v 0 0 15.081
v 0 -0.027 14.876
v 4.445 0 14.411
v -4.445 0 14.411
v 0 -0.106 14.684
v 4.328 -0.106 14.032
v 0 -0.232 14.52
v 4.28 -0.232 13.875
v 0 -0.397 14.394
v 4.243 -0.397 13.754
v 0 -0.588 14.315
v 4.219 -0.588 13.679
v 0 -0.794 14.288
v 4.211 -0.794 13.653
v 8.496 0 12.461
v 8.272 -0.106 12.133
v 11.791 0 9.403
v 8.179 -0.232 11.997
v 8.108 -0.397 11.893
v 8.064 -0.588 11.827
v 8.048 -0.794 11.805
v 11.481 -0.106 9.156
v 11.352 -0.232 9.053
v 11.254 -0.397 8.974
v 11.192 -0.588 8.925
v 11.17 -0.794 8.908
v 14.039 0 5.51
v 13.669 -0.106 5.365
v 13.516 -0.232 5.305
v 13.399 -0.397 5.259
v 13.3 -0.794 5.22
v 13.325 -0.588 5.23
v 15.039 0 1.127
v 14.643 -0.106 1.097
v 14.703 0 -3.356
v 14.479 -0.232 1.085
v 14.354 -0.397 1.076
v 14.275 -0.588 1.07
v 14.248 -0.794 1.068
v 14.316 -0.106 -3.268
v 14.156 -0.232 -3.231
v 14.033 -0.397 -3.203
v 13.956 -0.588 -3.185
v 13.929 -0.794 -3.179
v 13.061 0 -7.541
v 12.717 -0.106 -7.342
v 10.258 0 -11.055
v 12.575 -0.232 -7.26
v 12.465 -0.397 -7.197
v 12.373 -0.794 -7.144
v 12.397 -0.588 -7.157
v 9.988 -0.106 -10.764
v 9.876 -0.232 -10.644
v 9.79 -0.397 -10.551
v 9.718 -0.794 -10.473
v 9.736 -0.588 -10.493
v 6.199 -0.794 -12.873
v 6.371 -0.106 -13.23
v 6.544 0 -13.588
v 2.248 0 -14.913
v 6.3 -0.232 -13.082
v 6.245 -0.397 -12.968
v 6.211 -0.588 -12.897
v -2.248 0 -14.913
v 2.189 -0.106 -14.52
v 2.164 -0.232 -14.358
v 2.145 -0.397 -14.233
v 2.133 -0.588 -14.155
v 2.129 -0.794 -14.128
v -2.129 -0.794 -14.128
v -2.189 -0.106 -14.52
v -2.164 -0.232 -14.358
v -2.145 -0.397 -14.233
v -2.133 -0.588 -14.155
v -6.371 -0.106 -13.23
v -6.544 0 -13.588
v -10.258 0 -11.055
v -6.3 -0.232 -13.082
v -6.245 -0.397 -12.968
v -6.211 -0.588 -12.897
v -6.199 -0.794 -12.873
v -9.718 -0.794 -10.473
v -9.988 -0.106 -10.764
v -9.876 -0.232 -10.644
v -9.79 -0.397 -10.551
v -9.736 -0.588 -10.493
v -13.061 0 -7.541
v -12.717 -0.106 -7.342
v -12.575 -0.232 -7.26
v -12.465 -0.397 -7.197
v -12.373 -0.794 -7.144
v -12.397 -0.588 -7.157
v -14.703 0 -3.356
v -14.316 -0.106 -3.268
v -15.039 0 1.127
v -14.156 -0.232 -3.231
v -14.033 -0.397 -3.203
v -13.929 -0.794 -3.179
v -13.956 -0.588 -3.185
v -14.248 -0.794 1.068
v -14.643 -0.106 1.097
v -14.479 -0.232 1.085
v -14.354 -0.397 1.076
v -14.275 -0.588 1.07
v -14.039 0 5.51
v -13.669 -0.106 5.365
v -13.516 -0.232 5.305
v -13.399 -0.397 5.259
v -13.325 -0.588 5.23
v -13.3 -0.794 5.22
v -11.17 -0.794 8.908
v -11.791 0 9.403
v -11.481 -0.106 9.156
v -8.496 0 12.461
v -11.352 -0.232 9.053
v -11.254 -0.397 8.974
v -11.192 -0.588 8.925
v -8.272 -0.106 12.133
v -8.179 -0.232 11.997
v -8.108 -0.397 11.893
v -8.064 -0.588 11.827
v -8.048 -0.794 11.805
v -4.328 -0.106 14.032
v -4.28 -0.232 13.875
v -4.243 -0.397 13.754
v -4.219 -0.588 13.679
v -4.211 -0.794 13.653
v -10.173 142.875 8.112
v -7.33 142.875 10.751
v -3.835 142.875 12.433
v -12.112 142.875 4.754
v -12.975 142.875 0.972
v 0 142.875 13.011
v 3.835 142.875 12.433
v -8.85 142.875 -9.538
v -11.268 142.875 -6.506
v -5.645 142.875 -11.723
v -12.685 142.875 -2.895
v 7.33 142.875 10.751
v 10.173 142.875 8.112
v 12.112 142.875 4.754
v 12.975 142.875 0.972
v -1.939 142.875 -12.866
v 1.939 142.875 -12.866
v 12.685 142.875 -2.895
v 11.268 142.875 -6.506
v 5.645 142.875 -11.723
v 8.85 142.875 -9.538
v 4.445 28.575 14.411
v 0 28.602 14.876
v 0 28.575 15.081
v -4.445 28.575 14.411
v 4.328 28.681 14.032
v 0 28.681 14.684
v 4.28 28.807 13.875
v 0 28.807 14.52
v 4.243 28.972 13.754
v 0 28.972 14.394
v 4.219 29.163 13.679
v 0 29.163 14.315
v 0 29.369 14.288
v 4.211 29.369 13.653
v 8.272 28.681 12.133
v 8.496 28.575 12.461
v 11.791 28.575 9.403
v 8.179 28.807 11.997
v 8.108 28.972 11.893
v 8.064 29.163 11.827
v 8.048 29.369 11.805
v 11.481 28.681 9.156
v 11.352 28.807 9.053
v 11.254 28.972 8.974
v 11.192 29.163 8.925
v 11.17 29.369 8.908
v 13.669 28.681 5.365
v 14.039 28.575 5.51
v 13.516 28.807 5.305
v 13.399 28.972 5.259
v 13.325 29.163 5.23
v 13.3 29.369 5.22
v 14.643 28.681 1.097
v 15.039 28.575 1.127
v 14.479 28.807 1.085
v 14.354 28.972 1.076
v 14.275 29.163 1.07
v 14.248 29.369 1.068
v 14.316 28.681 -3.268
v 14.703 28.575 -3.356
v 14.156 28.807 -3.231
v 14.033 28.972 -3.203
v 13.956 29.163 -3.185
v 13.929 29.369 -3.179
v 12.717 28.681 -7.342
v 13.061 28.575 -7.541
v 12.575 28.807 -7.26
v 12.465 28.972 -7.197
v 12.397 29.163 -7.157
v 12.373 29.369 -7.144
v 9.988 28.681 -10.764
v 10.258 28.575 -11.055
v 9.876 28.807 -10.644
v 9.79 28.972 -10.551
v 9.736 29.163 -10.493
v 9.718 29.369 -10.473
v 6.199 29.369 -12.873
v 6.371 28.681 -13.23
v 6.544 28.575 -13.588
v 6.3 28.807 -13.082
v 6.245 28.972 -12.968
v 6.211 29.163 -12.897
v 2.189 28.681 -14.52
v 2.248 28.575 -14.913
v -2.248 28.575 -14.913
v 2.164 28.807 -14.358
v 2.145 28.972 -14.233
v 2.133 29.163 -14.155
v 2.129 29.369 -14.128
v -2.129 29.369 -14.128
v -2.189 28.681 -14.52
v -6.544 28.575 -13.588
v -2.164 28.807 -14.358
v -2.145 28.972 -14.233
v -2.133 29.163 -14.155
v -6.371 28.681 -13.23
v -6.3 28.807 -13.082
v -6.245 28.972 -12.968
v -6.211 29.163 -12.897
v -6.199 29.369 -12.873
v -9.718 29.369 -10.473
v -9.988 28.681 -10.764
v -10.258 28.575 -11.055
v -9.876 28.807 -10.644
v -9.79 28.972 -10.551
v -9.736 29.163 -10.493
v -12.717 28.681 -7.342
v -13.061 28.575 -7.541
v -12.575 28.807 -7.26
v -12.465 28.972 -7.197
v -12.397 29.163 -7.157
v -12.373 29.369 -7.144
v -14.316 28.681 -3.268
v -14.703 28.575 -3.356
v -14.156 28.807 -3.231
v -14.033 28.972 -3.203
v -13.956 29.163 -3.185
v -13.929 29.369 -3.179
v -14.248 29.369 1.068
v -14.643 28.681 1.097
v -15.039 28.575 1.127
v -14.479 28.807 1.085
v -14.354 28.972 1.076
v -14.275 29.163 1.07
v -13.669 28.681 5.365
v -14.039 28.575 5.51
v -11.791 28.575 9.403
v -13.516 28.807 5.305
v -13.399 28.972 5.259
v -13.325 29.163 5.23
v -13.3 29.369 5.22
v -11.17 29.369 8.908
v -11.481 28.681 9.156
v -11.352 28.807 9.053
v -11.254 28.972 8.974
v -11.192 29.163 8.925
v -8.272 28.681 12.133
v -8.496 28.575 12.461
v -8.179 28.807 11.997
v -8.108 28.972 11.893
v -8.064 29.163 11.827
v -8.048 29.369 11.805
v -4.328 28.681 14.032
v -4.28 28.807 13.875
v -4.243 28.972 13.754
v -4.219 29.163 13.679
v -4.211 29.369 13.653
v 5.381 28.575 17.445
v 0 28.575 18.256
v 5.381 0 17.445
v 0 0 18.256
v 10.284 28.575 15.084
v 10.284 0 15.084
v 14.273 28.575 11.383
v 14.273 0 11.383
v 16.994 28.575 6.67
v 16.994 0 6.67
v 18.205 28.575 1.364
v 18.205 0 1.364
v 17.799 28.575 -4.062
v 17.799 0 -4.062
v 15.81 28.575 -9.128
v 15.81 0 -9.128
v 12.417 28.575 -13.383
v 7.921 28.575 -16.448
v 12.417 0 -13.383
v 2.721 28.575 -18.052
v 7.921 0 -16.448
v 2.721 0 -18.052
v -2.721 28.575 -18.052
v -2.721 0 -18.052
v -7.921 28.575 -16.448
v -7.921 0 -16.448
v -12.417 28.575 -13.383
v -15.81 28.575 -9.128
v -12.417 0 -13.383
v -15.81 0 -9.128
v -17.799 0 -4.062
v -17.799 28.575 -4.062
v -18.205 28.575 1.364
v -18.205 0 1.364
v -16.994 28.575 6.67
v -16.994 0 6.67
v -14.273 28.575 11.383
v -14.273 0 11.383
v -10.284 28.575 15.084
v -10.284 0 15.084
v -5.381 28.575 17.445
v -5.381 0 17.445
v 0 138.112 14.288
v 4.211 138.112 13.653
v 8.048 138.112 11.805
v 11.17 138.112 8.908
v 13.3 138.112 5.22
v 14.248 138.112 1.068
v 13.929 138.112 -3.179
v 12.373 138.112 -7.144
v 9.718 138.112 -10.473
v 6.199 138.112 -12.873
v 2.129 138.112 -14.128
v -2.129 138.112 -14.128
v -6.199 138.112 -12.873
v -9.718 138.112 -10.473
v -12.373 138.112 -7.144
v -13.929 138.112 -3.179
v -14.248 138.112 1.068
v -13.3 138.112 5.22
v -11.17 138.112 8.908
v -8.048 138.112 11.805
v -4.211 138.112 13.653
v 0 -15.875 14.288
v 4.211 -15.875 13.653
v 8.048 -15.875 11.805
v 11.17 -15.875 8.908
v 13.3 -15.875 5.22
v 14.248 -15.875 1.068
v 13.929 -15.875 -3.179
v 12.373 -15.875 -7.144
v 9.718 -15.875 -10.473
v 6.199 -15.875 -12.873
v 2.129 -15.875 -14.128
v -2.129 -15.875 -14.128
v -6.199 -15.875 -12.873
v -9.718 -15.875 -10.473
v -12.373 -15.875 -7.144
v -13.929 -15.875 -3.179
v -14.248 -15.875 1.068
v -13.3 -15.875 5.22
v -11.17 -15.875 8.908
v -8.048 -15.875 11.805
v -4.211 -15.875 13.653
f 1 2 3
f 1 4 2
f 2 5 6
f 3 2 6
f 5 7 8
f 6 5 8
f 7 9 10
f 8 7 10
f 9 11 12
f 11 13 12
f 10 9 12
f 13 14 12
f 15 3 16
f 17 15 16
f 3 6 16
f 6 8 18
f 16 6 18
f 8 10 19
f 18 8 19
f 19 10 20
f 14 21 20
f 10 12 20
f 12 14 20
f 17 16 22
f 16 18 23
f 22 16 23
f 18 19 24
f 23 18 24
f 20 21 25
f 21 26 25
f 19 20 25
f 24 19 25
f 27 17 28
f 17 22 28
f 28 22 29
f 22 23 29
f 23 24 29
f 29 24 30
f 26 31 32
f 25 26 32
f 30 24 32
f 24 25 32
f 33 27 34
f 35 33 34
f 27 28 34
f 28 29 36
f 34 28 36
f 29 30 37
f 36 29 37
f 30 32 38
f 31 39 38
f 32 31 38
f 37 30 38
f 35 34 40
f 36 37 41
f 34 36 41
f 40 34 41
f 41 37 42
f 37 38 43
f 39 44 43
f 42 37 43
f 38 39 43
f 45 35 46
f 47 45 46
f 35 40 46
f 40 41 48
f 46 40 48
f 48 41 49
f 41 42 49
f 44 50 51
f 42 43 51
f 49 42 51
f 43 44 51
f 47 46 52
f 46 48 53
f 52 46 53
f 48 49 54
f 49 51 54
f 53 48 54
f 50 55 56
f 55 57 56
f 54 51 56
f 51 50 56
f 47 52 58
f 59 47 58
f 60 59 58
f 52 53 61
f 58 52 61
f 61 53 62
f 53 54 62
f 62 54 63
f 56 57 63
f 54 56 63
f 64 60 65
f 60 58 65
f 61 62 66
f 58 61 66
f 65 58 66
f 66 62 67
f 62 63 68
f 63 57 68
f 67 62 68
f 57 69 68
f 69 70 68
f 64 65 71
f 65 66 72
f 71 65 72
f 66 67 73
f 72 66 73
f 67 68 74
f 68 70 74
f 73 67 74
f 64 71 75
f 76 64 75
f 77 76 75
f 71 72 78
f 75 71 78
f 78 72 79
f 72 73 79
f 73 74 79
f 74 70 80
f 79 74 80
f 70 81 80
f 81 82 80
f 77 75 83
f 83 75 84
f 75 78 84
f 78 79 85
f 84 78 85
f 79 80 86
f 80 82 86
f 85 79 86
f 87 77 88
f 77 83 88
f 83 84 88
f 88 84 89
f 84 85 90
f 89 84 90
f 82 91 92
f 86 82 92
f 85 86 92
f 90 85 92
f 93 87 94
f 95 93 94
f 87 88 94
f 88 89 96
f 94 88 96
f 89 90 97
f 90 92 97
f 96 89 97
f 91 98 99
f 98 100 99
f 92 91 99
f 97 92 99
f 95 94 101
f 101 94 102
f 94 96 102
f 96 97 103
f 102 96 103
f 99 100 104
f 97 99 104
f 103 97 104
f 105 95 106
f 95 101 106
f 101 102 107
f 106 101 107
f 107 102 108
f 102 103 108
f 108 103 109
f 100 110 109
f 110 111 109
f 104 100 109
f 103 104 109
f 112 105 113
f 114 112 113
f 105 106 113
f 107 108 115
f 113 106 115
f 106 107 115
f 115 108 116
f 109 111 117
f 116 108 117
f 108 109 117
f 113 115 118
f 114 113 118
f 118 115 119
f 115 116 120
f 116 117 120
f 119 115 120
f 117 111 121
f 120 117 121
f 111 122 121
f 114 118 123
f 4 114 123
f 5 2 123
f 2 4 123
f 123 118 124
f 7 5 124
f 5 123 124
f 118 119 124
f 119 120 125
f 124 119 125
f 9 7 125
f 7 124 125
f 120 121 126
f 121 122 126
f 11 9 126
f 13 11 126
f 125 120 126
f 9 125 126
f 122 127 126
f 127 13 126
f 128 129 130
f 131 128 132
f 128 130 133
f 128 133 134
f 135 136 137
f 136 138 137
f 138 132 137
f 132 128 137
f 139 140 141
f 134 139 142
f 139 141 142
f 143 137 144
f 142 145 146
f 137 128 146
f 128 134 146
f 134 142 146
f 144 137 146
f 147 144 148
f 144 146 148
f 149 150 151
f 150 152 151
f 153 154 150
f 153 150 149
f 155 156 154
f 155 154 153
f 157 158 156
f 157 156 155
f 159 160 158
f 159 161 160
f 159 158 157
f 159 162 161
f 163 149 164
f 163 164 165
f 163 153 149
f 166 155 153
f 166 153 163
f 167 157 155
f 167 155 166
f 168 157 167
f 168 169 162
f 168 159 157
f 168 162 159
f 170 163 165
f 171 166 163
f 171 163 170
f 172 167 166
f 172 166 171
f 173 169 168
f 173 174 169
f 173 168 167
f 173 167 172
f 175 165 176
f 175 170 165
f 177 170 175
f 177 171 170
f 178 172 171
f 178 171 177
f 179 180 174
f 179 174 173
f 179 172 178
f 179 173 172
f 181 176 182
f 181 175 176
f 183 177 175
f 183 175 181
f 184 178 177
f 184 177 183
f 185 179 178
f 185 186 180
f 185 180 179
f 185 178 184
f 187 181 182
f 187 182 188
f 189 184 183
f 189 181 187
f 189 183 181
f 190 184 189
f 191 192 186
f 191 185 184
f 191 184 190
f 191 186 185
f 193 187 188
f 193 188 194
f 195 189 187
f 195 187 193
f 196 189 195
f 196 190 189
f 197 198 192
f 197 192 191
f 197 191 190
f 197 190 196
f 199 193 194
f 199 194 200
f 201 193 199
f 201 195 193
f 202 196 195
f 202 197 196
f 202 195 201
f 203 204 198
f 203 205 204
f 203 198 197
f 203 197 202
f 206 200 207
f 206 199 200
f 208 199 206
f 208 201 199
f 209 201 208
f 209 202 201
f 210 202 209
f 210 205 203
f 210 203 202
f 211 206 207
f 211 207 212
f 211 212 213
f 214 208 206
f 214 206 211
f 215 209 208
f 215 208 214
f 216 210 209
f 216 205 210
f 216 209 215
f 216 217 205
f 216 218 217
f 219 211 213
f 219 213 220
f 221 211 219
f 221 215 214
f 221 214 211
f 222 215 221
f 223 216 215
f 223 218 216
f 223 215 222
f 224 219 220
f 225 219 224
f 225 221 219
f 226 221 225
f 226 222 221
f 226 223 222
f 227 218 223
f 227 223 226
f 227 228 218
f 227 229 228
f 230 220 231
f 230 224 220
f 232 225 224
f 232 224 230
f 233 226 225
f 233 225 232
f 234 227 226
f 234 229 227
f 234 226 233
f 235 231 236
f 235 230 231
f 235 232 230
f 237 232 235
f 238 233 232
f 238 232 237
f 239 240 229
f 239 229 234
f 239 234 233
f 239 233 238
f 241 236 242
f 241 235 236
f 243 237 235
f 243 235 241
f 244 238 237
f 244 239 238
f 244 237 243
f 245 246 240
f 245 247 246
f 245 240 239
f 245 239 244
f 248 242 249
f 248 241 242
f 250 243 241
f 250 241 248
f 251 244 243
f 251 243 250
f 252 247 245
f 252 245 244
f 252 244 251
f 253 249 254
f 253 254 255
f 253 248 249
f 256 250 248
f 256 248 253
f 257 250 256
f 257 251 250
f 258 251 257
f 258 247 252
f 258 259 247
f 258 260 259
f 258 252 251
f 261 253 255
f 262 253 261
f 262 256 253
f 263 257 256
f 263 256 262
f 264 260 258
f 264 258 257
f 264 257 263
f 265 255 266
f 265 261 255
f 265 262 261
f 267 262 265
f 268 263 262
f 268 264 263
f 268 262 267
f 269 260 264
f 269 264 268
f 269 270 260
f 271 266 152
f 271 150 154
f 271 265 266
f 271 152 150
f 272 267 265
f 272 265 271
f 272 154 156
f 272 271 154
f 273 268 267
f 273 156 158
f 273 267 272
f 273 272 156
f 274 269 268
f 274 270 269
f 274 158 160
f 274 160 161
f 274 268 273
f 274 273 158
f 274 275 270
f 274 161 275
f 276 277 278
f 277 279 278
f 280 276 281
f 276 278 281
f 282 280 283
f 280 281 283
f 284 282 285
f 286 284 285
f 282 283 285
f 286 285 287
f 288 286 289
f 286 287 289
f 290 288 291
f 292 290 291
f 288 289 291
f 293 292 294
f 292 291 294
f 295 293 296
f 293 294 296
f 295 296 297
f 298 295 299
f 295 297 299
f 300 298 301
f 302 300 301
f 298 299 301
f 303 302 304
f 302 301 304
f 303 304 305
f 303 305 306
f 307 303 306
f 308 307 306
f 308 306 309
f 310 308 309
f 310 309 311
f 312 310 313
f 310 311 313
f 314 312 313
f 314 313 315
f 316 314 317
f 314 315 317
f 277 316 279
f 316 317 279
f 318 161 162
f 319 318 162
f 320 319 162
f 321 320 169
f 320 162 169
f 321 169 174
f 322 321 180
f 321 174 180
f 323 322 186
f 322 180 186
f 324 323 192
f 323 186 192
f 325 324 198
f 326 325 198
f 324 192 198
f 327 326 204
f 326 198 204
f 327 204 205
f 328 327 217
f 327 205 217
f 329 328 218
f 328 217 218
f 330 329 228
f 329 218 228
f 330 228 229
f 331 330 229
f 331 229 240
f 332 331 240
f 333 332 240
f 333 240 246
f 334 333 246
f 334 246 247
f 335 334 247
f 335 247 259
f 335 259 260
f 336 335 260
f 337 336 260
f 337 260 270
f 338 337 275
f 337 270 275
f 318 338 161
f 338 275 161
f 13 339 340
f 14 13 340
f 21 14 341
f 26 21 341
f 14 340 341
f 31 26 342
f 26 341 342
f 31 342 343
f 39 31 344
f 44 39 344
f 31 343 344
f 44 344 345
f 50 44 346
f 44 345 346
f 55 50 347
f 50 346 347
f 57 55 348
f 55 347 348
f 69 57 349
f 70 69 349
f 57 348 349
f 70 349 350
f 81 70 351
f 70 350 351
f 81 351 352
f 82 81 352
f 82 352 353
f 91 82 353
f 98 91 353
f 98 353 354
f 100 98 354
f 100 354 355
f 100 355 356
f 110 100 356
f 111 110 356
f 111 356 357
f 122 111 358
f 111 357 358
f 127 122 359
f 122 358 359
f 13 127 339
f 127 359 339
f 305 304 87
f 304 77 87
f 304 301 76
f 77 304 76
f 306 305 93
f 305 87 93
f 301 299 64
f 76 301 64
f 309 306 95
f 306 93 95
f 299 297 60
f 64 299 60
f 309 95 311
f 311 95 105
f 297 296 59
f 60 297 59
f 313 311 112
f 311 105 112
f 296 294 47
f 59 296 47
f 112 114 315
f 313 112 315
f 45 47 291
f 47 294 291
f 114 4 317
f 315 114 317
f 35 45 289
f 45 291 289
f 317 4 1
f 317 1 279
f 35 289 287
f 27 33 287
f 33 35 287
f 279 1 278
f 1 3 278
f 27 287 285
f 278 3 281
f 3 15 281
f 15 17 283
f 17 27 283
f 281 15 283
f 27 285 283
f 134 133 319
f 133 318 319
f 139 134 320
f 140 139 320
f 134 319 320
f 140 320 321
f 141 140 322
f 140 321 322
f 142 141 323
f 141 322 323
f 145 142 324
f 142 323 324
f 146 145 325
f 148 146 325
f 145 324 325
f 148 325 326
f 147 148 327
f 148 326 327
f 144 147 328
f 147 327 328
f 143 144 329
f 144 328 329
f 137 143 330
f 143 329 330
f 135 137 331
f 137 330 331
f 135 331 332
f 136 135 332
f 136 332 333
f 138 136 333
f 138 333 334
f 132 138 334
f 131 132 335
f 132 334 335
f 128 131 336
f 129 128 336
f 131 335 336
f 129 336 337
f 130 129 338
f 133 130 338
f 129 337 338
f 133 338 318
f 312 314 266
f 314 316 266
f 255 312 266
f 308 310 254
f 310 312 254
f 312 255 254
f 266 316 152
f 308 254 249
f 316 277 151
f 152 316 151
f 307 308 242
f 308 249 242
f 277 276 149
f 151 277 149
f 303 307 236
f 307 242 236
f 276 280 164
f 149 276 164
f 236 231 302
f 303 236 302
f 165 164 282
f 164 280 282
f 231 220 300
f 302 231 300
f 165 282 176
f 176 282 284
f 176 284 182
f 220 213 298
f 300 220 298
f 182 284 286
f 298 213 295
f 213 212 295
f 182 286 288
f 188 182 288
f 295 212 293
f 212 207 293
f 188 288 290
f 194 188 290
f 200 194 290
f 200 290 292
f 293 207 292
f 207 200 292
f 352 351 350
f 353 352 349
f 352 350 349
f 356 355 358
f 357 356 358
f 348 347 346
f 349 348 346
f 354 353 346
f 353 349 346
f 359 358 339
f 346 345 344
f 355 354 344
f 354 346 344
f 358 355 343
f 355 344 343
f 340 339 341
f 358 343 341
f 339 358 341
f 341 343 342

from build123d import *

# Parameters (mm, degrees)
F2_R = 0.79375
F3_R = 0.79375


with BuildPart() as f1:
    # F0 (on Right) → F1 (revolve)
    with BuildSketch(Plane.YZ):
        Polygon((-15.875, 14.2875), (-15.875, 0), (142.875, 0), (142.875, 13.011392), (138.1125, 14.2875), (28.575, 14.2875), (28.575, 18.25625), (0, 18.25625), (0, 14.2875), align=None)
    revolve(axis=Axis((0, 63.5, 0), (0, 1, 0)))

    # F2
    f2_edges = [f1.edges().sort_by_distance(p)[0] for p in [
        (0, 0, -14.2875),
    ]]
    fillet(f2_edges, radius=F2_R)

    # F3
    f3_edges = [f1.edges().sort_by_distance(p)[0] for p in [
        (0, 28.575, -14.2875),
    ]]
    fillet(f3_edges, radius=F3_R)


solid = f1.part
